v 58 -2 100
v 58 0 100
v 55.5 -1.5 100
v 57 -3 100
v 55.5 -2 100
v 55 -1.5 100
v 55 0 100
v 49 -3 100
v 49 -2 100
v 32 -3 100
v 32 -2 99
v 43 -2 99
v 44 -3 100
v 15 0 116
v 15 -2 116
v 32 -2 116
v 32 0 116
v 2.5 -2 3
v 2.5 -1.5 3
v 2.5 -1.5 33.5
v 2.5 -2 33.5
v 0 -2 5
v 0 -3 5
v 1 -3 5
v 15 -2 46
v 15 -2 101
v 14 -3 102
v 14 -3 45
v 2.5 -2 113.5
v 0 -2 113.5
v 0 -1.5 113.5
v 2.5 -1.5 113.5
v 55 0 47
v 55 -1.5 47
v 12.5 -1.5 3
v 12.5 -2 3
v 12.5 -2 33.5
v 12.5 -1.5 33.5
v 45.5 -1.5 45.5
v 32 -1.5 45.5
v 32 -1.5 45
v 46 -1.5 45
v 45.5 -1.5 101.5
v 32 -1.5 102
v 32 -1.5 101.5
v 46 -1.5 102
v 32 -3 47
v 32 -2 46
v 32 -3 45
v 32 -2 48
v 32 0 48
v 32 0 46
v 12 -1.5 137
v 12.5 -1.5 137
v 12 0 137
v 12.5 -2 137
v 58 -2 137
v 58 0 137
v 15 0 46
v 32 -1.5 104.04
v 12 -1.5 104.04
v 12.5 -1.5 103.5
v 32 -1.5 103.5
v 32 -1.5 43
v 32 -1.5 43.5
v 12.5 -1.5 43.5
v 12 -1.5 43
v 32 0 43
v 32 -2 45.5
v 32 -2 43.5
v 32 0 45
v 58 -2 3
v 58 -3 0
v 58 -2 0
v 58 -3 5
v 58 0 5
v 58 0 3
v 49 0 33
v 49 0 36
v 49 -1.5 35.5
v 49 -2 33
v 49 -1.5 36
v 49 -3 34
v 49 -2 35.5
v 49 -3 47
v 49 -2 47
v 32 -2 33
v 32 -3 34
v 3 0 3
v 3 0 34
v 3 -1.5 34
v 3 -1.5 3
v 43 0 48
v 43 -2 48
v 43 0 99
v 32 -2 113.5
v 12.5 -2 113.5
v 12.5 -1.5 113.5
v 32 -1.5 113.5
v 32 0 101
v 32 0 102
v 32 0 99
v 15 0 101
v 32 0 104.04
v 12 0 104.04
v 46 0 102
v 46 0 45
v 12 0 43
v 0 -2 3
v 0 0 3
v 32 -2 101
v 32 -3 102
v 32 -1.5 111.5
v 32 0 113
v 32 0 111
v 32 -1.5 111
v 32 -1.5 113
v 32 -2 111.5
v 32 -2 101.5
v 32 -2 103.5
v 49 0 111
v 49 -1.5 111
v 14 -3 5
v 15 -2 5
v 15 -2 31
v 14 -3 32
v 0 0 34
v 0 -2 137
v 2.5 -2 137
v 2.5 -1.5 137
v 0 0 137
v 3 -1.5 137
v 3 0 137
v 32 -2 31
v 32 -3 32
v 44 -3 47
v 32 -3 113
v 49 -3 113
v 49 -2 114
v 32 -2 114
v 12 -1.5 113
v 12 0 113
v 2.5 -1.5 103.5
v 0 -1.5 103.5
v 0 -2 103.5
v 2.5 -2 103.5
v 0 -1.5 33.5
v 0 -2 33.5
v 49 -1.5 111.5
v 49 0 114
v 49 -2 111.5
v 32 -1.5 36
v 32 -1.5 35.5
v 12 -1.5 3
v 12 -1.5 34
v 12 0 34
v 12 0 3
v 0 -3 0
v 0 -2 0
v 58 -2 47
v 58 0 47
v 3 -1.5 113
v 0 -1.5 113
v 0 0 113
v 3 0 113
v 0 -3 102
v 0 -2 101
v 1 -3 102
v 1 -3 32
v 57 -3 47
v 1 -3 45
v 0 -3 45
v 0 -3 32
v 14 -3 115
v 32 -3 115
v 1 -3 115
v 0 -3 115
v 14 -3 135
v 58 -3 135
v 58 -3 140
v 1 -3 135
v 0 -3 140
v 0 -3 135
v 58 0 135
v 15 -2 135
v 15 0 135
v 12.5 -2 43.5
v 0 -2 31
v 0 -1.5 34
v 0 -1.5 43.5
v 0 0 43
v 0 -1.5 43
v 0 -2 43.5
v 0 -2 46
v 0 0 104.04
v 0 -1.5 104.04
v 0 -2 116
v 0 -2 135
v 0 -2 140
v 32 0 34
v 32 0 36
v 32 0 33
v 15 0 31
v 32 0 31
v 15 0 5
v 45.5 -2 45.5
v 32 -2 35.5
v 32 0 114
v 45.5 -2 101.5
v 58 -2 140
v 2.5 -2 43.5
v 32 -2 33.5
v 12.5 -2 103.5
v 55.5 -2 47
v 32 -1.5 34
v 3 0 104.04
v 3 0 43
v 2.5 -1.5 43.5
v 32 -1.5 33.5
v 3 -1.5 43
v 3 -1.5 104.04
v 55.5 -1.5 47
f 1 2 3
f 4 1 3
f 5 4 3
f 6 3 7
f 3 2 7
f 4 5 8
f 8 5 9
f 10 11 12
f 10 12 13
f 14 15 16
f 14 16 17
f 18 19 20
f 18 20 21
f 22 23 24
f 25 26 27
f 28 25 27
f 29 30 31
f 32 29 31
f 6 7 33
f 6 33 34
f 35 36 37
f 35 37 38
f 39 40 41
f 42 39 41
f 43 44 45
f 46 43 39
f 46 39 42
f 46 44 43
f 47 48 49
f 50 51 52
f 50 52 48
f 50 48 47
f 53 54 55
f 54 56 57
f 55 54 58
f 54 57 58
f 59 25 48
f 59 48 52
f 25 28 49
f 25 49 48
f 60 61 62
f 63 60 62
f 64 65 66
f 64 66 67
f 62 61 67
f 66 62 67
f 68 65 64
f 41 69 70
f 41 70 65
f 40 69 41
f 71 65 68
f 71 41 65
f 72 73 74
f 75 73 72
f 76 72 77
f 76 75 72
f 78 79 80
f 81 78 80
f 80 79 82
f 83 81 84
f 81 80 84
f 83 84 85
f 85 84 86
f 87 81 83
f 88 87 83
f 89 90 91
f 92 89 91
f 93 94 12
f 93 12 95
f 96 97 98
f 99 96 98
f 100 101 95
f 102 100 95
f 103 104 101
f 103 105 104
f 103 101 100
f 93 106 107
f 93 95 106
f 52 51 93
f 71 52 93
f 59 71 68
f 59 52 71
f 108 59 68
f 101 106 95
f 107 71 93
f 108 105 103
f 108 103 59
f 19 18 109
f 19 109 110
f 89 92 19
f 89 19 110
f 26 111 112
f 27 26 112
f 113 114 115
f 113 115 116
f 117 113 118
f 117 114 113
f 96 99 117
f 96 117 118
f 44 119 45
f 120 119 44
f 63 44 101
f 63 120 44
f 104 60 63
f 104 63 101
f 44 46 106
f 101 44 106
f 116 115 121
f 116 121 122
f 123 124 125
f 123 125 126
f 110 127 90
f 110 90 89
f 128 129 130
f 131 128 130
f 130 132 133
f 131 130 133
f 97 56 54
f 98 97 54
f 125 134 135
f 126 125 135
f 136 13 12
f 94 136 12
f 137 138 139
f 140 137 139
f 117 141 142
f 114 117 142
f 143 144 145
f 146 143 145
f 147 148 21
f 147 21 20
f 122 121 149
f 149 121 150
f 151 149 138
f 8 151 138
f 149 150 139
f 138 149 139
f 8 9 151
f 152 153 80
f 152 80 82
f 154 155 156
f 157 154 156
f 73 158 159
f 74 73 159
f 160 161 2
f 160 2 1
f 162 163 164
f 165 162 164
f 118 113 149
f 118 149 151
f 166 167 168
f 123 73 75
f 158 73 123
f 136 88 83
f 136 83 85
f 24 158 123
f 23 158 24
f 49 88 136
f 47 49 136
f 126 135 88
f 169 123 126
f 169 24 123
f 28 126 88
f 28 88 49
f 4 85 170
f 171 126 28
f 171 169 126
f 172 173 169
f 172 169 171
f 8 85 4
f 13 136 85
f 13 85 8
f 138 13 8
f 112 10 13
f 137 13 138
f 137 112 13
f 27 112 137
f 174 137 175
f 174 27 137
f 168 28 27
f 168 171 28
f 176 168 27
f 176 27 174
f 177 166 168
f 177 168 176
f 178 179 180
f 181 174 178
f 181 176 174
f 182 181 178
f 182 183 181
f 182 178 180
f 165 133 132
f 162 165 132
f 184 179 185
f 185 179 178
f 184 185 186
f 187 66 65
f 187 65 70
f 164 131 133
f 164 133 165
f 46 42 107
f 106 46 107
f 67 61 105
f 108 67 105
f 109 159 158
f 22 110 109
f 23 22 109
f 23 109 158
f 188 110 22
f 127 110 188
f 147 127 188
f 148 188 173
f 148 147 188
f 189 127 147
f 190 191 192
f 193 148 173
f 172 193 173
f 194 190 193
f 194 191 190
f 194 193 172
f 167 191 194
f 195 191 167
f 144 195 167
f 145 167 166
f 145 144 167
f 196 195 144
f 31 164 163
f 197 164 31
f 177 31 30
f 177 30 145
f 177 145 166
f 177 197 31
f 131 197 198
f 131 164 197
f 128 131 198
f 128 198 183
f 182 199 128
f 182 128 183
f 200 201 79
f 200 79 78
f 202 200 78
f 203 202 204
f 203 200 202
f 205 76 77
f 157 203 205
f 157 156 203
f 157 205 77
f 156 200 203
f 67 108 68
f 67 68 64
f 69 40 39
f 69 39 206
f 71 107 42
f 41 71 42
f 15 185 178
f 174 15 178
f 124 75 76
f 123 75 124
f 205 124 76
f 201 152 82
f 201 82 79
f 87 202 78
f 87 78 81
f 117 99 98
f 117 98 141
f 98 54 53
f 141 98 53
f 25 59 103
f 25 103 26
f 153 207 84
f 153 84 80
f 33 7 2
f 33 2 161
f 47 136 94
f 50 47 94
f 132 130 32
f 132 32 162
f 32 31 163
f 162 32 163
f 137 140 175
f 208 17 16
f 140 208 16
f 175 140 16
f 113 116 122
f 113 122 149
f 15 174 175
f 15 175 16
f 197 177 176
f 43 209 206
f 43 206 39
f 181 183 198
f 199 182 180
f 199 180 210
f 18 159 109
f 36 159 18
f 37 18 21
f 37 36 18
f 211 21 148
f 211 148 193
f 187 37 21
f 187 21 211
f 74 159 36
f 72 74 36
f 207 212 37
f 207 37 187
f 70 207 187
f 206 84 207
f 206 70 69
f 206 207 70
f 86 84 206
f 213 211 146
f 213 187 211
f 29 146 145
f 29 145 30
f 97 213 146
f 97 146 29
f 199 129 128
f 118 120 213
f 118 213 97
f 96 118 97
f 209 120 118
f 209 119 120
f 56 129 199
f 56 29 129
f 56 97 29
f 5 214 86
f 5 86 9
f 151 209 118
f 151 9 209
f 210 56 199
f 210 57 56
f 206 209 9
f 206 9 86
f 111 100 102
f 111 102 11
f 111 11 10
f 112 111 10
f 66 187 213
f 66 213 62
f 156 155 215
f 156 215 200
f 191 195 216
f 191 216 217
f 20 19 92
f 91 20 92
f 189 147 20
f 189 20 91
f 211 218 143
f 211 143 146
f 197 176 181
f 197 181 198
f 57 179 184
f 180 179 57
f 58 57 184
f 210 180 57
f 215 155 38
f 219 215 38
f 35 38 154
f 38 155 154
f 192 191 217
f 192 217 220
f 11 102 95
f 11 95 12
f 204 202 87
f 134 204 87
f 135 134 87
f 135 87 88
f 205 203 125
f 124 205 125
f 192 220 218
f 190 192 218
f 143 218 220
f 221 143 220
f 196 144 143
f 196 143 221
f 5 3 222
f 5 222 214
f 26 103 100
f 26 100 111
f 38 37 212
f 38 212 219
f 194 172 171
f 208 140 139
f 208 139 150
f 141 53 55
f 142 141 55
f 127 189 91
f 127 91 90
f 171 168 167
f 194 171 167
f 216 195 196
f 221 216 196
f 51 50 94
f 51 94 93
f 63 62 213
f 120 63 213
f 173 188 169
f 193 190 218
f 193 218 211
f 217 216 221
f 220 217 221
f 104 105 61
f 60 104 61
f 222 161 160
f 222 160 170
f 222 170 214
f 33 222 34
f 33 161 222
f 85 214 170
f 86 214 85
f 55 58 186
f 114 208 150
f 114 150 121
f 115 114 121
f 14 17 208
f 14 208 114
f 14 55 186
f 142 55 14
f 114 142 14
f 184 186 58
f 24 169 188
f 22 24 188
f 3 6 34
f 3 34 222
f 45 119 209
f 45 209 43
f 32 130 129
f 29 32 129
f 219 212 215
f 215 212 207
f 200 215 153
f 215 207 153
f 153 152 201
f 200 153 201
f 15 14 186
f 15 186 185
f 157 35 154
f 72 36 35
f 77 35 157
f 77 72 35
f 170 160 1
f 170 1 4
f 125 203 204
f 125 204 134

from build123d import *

# Parameters (mm, degrees)
PAD_DEPTH       = 140
SKETCH001_W     = 3
SKETCH001_H     = 5
PAD001_DEPTH    = 58
SKETCH002_W     = 2
SKETCH002_H     = 3
POCKET_DEPTH    = 58
SKETCH003_W     = 3
SKETCH003_H     = 5
PAD002_DEPTH    = 58
SKETCH004_W     = 2
SKETCH004_H     = 3
POCKET001_DEPTH = 58
PAD003_DEPTH    = 32
PAD004_DEPTH    = 32
PAD005_DEPTH    = 17
PAD006_DEPTH    = 17
PAD007_DEPTH    = 53
POCKET002_DEPTH = 134
POCKET003_DEPTH = 57
POCKET004_DEPTH = 32
POCKET005_DEPTH = 17
POCKET006_DEPTH = 17
POCKET007_DEPTH = 32


with BuildPart() as part:
    # Sketch → Pad (new body)
    with BuildSketch(Plane.XY):
        Polygon((0, 0), (15, 0), (15, -2), (14, -3), (1, -3), (0, -2), align=None)
    extrude(amount=PAD_DEPTH)

    # Sketch001 (on Face2 of Pad) → Pad001 (join)
    with BuildSketch(Plane.YZ):
        with Locations((-1.5, 137.5)):
            Rectangle(SKETCH001_W, SKETCH001_H)
    extrude(amount=PAD001_DEPTH)

    # Sketch002 (on Face15 of Pad001) → Pocket (cut)
    with BuildSketch(Plane.YZ.offset(58)):
        with Locations((-1, 138.5)):
            Rectangle(SKETCH002_W, SKETCH002_H)
    extrude(amount=-POCKET_DEPTH, mode=Mode.SUBTRACT)

    # Sketch003 (on Face3 of Pocket) → Pad002 (join)
    with BuildSketch(Plane.YZ):
        with Locations((-1.5, 2.5)):
            Rectangle(SKETCH003_W, SKETCH003_H)
    extrude(amount=PAD002_DEPTH)

    # Sketch004 (on Face9 of Pad002) → Pocket001 (cut)
    with BuildSketch(Plane.YZ.offset(58)):
        with Locations((-1, 1.5)):
            Rectangle(SKETCH004_W, SKETCH004_H)
    extrude(amount=-POCKET001_DEPTH, mode=Mode.SUBTRACT)

    # Sketch005 (on Face9 of Pocket001) → Pad003 (join)
    with BuildSketch(Plane.YZ):
        Polygon((0, 31), (-2, 31), (-3, 32), (-3, 45), (-2, 46), (0, 46), align=None)
    extrude(amount=PAD003_DEPTH)

    # Sketch006 (on Face30 of Pad003) → Pad004 (join)
    with BuildSketch(Plane.YZ):
        Polygon((0, 116), (0, 101), (-2, 101), (-3, 102), (-3, 115), (-2, 116), align=None)
    extrude(amount=PAD004_DEPTH)

    # Sketch007 (on Face28 of Pad004) → Pad005 (join)
    with BuildSketch(Plane.YZ.offset(32)):
        Polygon((0, 48), (0, 33), (-2, 33), (-3, 34), (-3, 47), (-2, 48), align=None)
    extrude(amount=PAD005_DEPTH)

    # Sketch008 (on Face56 of Pad005) → Pad006 (join)
    with BuildSketch(Plane.YZ.offset(32)):
        Polygon((-2, 114), (0, 114), (0, 99), (-2, 99), (-3, 100), (-3, 113), align=None)
    extrude(amount=PAD006_DEPTH)

    # Sketch009 (on Face40 of Pad006) → Pad007 (join)
    with BuildSketch(Plane.XY.offset(47)):
        Polygon((43, 0), (58, 0), (58, -2), (57, -3), (44, -3), (43, -2), align=None)
    extrude(amount=PAD007_DEPTH)

    # Sketch010 (on Face87 of Pad007) → Pocket002 (cut)
    with BuildSketch(Plane.XY.offset(137)):
        Polygon((2.5, -2), (12.5, -2), (12.5, -1.5), (12, -1.5), (12, 0), (3, 0), (3, -1.5), (2.5, -1.5), align=None)
    extrude(amount=-POCKET002_DEPTH, mode=Mode.SUBTRACT)

    # Sketch011 (on Face103 of Pocket002) → Pocket003 (cut)
    with BuildSketch(Plane.XY.offset(102)):
        Polygon((55.5, -2), (45.5, -2), (45.5, -1.5), (46, -1.5), (46, 0), (55, 0), (55, -1.5), (55.5, -1.5), align=None)
    extrude(amount=-POCKET003_DEPTH, mode=Mode.SUBTRACT)

    # Sketch012 (on Face112 of Pocket003) → Pocket004 (cut)
    with BuildSketch(Plane(origin=(0, 0, 0), x_dir=(0, -1, 0), z_dir=(-1, 0, 0))):
        Polygon((2, 113.5), (1.5, 113.5), (1.5, 113), (0, 113), (0, 104.04), (1.5, 104.04), (1.5, 103.5), (2, 103.5), align=None)
    extrude(amount=-POCKET004_DEPTH, mode=Mode.SUBTRACT)

    # Sketch013 (on Face70 of Pocket004) → Pocket005 (cut)
    with BuildSketch(Plane(origin=(32, 0, 0), x_dir=(0, -1, 0), z_dir=(-1, 0, 0))):
        Polygon((0, 111), (1.5, 111), (1.5, 111.5), (2, 111.5), (2, 101.5), (1.5, 101.5), (1.5, 102), (0, 102), align=None)
    extrude(amount=-POCKET005_DEPTH, mode=Mode.SUBTRACT)

    # Sketch014 (on Face59 of Pocket005) → Pocket006 (cut)
    with BuildSketch(Plane(origin=(32, 0, 0), x_dir=(0, -1, 0), z_dir=(-1, 0, 0))):
        Polygon((0, 45), (1.5, 45), (1.5, 45.5), (2, 45.5), (2, 35.5), (1.5, 35.5), (1.5, 36), (0, 36), align=None)
    extrude(amount=-POCKET006_DEPTH, mode=Mode.SUBTRACT)

    # Sketch015 (on Face127 of Pocket006) → Pocket007 (cut)
    with BuildSketch(Plane(origin=(0, 0, 0), x_dir=(0, -1, 0), z_dir=(-1, 0, 0))):
        Polygon((2, 33.5), (1.5, 33.5), (1.5, 34), (0, 34), (0, 43), (1.5, 43), (1.5, 43.5), (2, 43.5), align=None)
    extrude(amount=-POCKET007_DEPTH, mode=Mode.SUBTRACT)


solid = part.part
